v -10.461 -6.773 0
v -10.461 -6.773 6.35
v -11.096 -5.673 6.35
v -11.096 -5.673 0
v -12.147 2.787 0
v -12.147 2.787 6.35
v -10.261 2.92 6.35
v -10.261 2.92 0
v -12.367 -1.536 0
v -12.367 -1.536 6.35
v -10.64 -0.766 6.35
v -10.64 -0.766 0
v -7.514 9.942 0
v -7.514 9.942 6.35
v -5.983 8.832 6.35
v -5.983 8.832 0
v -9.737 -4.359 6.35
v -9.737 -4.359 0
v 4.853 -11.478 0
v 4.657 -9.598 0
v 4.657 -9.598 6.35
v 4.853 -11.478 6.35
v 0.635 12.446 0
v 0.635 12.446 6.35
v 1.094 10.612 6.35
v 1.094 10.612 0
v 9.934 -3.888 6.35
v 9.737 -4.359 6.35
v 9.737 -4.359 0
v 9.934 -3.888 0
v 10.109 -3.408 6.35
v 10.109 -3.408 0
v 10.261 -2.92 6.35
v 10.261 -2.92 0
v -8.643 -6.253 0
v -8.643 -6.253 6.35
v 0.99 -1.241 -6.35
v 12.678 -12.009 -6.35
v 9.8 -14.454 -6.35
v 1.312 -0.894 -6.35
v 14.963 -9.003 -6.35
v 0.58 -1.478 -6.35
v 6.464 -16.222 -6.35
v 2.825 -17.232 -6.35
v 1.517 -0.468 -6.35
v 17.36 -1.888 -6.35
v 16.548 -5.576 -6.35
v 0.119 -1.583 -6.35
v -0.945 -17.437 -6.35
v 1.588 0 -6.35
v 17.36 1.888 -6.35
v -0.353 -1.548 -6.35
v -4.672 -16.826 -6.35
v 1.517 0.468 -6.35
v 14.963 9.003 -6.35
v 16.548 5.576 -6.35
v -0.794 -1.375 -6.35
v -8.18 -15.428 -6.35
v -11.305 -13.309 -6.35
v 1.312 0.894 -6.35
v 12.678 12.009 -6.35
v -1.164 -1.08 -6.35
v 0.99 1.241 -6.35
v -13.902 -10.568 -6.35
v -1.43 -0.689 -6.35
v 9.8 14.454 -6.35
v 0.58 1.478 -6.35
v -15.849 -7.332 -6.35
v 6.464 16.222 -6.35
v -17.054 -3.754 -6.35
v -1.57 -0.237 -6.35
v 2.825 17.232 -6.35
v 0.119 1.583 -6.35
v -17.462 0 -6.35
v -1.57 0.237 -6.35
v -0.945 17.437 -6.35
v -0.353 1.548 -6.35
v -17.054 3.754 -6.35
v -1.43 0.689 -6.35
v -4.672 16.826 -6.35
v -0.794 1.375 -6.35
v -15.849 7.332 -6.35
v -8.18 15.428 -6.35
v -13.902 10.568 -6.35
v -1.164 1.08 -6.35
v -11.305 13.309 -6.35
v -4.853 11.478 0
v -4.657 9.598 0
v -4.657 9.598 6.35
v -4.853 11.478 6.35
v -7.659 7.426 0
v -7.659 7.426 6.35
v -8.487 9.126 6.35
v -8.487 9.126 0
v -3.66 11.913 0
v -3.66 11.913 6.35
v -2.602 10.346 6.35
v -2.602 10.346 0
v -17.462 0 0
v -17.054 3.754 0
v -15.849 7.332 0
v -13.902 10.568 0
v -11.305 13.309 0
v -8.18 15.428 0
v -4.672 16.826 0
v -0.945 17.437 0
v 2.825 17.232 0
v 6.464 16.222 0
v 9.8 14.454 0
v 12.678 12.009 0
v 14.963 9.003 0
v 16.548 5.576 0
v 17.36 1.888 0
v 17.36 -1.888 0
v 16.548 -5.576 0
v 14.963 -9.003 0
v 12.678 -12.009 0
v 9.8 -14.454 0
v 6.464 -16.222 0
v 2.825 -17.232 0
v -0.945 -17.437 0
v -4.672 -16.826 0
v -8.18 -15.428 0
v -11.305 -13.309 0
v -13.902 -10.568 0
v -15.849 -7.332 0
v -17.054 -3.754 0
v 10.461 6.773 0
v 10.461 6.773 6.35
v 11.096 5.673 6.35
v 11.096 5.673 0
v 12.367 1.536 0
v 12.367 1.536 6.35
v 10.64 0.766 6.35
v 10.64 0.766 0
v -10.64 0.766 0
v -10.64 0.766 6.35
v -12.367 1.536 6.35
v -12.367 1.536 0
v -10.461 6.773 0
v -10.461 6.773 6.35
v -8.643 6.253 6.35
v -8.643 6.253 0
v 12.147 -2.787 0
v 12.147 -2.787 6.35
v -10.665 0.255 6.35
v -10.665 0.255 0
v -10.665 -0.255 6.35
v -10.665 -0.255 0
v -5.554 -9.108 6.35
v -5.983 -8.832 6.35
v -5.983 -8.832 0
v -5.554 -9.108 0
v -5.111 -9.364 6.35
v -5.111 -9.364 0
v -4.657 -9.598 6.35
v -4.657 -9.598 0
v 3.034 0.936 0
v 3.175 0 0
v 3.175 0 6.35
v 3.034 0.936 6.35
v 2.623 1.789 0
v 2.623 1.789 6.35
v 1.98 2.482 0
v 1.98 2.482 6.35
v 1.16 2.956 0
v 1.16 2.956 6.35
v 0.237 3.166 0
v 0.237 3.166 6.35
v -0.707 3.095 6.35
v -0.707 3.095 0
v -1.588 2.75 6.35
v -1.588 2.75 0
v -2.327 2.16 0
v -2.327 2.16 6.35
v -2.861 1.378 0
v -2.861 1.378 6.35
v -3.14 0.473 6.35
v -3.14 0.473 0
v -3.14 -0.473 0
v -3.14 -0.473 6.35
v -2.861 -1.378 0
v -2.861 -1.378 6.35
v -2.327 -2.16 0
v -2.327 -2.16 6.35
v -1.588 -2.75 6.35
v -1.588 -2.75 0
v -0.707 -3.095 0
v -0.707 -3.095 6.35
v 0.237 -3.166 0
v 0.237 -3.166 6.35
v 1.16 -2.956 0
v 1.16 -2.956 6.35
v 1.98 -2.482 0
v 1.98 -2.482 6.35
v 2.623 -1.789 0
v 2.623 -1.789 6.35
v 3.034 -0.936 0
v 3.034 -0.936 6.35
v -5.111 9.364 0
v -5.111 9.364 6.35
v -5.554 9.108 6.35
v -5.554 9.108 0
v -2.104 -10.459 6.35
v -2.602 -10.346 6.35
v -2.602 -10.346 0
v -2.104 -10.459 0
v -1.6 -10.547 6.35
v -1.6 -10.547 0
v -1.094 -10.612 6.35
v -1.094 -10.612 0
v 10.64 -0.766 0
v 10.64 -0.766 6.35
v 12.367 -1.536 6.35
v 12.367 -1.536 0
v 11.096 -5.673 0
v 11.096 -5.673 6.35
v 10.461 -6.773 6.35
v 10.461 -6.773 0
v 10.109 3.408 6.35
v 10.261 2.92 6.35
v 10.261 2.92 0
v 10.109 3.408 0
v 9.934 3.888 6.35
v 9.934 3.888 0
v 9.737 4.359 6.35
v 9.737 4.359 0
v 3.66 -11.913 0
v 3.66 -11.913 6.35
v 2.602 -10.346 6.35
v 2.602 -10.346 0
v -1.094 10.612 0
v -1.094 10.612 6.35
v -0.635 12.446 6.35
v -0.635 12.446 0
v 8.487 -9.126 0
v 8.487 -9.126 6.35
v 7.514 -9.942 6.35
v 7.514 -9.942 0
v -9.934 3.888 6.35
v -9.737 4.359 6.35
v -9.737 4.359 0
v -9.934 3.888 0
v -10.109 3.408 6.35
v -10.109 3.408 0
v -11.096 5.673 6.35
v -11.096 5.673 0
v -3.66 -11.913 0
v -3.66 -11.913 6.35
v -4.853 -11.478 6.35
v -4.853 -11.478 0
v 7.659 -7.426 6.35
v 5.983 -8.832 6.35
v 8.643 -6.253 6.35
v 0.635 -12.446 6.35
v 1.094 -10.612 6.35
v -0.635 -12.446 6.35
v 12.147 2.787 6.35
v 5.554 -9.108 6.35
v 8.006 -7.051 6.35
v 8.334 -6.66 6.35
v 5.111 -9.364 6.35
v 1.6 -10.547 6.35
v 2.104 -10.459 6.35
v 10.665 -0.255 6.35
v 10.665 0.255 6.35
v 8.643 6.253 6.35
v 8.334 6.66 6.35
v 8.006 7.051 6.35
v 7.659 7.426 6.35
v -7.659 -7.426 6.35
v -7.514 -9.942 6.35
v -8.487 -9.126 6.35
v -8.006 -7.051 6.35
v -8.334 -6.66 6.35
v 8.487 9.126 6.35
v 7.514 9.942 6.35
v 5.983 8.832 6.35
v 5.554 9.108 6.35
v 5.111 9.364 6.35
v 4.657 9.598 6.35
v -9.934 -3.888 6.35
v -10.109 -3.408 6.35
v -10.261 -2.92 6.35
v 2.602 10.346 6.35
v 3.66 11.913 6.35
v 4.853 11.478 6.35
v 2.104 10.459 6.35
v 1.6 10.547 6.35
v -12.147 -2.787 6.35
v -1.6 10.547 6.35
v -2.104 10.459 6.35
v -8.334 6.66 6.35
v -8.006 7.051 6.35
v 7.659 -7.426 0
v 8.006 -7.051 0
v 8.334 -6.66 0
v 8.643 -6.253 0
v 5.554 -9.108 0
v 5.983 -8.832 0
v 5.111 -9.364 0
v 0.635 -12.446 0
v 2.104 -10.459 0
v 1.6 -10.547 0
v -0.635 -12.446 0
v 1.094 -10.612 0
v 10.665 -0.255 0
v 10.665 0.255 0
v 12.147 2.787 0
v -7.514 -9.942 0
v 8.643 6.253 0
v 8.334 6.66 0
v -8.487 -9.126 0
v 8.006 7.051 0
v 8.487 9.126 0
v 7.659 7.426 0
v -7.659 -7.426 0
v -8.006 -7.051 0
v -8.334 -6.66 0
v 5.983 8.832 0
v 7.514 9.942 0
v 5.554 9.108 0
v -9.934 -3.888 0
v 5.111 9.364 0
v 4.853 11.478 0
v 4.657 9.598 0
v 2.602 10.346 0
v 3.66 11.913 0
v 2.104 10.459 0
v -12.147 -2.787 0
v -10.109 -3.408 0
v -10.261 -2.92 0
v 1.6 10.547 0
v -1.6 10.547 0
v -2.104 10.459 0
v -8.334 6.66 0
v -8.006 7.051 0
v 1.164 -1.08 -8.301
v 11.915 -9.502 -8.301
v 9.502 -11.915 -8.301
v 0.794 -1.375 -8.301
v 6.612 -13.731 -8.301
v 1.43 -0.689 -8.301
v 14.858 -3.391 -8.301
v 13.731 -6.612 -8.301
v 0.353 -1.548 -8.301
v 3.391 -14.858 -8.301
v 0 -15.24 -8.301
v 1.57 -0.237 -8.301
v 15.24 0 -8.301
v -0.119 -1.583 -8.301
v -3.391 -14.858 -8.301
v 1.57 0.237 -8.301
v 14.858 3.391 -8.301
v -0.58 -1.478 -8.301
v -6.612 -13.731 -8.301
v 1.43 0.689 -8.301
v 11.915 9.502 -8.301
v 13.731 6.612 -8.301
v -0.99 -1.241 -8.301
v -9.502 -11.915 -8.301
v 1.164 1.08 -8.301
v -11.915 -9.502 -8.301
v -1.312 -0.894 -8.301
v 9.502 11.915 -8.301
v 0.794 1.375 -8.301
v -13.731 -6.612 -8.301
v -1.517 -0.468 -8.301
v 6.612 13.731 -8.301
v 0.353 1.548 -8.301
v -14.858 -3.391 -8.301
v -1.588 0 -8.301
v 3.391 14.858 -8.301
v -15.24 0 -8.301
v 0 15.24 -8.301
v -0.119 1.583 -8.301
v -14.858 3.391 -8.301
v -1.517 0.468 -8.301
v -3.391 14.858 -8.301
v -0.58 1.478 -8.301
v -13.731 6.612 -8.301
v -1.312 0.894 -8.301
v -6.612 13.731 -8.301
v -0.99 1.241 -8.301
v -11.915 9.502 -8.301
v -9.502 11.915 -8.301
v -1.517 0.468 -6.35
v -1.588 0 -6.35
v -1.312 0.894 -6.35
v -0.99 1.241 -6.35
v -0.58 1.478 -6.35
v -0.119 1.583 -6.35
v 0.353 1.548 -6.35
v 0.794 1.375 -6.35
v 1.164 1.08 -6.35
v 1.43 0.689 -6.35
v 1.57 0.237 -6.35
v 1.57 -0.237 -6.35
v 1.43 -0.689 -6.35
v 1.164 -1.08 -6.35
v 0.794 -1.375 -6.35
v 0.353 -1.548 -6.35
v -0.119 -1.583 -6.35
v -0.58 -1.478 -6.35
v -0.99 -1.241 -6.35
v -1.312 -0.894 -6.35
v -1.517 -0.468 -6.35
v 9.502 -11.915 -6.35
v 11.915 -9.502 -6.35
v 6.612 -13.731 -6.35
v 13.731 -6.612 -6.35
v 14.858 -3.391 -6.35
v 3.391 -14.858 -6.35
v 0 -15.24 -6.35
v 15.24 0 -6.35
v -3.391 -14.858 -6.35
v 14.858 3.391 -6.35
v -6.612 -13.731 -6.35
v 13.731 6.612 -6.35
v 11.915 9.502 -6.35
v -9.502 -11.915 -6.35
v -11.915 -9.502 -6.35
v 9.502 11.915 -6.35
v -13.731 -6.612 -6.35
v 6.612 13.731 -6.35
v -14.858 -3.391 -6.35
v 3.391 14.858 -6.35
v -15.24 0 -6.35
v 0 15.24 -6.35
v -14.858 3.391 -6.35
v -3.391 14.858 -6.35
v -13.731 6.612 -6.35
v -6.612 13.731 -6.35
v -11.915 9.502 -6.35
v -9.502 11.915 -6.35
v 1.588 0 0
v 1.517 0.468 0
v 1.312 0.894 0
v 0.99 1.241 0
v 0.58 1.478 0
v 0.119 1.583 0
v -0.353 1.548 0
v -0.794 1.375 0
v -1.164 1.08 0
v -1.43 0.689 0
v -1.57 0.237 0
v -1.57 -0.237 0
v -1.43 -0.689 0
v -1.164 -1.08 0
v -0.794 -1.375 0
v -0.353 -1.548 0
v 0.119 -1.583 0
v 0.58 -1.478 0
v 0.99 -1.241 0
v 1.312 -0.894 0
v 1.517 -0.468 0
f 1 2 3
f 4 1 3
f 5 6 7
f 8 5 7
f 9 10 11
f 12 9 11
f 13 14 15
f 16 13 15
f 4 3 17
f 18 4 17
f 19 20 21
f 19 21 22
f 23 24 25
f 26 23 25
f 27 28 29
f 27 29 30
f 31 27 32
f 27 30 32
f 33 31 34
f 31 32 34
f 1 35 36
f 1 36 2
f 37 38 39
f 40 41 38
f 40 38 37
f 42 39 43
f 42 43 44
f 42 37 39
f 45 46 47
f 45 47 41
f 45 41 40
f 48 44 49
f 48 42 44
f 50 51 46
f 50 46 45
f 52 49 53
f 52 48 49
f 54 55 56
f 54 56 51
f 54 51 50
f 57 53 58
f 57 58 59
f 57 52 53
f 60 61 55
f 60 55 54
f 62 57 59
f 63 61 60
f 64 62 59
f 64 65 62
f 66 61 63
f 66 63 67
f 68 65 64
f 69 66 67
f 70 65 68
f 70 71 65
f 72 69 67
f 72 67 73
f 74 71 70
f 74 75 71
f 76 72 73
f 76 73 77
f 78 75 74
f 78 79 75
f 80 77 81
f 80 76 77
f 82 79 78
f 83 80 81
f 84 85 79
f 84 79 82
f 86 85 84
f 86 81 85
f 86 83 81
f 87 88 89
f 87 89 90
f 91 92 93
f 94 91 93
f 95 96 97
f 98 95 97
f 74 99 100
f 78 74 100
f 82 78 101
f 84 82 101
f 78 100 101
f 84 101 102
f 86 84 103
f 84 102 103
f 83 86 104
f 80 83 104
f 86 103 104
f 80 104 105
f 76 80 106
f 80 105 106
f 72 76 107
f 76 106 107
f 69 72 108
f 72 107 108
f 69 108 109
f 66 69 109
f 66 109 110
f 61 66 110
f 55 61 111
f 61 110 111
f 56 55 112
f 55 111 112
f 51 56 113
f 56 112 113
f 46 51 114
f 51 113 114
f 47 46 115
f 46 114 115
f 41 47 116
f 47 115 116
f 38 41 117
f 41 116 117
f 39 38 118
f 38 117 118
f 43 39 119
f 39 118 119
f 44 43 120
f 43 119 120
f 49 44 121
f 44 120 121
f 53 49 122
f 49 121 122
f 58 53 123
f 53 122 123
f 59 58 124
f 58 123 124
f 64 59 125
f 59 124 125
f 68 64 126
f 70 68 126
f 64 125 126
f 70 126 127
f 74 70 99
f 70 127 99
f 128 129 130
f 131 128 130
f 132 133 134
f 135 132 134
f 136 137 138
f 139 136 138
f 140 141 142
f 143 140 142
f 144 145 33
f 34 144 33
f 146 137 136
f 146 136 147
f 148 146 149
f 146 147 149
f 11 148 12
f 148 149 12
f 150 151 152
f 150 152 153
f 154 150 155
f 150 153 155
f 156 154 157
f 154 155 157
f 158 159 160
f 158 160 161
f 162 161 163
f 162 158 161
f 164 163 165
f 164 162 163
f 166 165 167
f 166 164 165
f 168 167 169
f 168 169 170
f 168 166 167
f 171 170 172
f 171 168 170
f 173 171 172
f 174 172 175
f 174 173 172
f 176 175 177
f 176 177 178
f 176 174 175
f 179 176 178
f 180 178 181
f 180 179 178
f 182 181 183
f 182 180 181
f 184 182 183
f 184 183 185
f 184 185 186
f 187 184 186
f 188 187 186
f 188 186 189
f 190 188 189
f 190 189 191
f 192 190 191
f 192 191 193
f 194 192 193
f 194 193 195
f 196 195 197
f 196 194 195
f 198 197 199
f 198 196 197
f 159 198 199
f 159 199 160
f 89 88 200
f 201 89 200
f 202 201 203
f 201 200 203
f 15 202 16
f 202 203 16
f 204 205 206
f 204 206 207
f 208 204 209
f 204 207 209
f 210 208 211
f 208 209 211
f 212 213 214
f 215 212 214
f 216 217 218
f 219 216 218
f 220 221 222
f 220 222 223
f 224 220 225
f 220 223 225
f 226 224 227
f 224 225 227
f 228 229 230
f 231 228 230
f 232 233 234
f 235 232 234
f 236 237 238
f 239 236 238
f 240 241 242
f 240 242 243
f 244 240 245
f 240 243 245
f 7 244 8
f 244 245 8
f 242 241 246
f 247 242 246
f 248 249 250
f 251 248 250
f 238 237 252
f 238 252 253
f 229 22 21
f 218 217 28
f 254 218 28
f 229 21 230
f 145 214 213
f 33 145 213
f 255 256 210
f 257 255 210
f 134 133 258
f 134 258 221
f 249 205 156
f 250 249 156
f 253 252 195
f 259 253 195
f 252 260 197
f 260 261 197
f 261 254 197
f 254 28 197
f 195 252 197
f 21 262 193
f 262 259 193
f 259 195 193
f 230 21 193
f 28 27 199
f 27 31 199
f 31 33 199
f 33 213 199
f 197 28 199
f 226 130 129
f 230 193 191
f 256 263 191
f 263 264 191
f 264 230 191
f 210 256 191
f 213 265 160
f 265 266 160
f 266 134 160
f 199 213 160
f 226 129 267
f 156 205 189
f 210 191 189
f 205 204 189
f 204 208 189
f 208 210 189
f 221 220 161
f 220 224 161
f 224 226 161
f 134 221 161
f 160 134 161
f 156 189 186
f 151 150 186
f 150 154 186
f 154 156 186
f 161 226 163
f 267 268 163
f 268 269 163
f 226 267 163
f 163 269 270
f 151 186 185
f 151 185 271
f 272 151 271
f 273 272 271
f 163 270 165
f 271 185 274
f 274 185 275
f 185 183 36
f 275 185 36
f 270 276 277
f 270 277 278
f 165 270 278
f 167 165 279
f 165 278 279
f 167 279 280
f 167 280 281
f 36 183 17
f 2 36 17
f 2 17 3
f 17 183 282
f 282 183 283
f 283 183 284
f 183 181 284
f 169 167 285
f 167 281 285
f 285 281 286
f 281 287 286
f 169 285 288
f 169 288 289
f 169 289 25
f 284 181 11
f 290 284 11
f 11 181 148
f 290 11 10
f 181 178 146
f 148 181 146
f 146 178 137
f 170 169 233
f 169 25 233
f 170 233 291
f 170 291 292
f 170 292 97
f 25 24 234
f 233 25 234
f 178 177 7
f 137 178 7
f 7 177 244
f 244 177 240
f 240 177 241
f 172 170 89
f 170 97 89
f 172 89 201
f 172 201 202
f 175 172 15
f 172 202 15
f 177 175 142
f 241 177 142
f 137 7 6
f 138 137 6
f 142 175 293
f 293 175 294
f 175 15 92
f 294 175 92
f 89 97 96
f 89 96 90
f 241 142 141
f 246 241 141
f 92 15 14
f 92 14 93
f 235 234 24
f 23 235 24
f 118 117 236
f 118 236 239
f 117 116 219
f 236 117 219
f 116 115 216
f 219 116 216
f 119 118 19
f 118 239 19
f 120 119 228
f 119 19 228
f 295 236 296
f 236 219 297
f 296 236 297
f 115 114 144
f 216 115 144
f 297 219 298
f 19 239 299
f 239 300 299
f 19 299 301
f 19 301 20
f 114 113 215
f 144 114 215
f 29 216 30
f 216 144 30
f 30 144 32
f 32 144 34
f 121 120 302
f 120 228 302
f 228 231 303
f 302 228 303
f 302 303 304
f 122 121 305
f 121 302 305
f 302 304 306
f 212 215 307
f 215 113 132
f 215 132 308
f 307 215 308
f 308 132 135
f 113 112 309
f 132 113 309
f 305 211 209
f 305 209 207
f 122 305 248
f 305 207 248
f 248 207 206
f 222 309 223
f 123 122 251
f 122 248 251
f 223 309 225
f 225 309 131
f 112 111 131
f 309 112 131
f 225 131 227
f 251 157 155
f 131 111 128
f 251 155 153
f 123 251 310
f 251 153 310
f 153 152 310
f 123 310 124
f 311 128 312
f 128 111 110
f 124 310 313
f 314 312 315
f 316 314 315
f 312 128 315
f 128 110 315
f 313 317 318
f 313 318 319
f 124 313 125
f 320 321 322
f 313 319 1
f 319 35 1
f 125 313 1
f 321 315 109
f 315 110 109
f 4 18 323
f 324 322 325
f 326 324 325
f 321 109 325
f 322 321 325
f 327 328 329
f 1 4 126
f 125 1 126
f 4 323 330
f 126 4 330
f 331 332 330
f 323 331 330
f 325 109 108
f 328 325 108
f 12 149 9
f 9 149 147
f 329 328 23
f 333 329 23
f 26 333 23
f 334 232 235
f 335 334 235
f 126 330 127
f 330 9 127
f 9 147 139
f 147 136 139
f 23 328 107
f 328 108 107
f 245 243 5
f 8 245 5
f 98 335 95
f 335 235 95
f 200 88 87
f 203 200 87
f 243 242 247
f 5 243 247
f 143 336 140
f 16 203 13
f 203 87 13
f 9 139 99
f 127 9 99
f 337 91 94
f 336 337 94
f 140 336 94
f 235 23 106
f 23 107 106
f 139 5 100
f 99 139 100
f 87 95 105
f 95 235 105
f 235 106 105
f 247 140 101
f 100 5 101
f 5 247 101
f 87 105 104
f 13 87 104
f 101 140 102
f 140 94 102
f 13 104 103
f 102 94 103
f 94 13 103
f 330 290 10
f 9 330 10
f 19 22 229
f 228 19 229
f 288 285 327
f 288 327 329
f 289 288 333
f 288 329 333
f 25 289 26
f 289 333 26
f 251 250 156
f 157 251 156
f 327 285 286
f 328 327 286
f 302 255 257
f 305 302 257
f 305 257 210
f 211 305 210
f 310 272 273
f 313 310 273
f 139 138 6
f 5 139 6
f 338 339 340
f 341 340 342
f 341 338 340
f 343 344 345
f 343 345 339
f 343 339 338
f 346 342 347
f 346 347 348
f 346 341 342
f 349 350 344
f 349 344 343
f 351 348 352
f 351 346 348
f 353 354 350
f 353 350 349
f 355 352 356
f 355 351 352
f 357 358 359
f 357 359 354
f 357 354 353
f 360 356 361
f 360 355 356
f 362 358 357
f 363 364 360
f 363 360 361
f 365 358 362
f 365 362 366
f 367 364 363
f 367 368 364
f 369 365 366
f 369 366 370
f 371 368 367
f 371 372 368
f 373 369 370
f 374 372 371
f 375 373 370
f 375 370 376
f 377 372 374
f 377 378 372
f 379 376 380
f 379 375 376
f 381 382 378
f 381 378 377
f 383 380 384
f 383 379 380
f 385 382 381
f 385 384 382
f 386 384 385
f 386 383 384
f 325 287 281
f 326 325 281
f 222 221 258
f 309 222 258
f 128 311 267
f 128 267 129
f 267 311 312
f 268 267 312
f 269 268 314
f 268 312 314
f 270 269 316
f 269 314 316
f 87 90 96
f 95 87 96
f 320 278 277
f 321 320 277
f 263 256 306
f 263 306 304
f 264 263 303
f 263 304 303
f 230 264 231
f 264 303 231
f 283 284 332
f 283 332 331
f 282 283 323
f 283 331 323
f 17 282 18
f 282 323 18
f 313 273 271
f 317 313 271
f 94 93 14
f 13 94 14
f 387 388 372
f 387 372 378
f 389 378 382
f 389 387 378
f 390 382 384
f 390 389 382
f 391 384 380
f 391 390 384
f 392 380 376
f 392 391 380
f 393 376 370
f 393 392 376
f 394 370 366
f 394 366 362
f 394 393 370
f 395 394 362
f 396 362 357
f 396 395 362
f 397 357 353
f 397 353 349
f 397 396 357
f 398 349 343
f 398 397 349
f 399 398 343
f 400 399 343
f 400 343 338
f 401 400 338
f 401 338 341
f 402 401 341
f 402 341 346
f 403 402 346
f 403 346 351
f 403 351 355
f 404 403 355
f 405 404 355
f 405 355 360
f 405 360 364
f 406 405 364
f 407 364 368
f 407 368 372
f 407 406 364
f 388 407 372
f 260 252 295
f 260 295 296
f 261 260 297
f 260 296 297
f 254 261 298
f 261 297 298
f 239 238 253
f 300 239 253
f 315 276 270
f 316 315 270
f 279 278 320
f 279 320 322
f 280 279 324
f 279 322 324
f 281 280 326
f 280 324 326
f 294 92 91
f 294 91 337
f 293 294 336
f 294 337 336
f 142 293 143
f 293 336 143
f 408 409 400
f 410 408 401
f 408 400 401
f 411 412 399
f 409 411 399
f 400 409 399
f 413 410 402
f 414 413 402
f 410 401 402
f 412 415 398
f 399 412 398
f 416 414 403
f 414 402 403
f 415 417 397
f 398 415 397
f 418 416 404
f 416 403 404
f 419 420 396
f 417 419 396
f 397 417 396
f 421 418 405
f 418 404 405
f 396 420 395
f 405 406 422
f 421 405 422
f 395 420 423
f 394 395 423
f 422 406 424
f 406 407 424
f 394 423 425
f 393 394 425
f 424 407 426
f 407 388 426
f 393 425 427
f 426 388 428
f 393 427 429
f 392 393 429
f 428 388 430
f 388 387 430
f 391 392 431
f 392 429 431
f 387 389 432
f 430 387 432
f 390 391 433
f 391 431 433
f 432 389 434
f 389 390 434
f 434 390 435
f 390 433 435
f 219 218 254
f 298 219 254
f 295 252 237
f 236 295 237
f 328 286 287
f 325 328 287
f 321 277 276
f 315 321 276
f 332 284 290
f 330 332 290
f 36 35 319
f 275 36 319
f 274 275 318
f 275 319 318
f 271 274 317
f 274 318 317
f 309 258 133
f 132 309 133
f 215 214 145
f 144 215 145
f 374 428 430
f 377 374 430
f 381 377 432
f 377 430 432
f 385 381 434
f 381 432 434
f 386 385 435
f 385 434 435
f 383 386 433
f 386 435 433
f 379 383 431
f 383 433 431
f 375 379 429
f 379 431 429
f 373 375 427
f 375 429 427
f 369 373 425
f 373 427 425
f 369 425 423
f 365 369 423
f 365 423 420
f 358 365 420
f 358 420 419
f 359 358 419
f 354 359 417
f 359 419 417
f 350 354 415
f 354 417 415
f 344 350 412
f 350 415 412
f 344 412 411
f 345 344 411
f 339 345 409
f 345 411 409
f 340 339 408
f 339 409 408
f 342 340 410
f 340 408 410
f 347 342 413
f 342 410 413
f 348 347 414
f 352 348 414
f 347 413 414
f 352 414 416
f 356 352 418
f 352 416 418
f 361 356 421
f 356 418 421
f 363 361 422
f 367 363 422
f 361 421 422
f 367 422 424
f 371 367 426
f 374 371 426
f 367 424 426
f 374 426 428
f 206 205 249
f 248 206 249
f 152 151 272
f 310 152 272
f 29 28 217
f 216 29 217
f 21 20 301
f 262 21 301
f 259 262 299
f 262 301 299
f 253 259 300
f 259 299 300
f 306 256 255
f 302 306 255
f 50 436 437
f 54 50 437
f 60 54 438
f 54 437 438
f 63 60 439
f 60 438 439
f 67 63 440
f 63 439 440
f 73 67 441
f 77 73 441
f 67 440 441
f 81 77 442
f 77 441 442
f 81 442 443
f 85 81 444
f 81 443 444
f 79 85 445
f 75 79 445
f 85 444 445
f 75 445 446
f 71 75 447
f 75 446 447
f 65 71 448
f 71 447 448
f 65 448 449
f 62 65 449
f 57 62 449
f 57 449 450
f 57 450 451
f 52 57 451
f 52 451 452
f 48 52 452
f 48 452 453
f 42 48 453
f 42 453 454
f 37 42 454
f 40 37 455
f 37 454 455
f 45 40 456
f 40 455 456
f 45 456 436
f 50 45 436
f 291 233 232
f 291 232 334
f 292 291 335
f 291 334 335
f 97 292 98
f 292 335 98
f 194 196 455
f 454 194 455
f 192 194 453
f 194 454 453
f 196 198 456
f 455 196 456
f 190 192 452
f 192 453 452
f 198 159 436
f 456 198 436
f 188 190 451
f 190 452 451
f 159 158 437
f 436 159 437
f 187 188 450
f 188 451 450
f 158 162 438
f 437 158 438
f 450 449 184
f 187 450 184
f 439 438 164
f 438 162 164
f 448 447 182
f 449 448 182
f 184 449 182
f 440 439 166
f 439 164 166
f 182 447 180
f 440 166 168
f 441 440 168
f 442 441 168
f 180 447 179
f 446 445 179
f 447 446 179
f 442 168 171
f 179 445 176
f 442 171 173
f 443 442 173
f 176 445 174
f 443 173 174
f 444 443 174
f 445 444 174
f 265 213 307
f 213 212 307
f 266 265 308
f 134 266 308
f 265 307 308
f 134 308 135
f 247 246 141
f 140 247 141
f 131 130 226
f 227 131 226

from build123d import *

# Parameters (mm, degrees)
SKETCH1_R           = 10.668
SKETCH1_R_2         = 3.175
BOSS_EXTRUDE1_DEPTH = 6.35
BOSS_EXTRUDE2_DEPTH = 6.35
SKETCH3_R           = 17.4625
BOSS_EXTRUDE3_DEPTH = 6.35
SKETCH4_R           = 1.5875
CUT_EXTRUDE1_DEPTH  = 6.35
SKETCH5_R           = 15.24
SKETCH5_R_2         = 1.5875
BOSS_EXTRUDE4_DEPTH = 1.95072


with BuildPart() as part:
    # Sketch1 → Boss-Extrude1 (new body)
    with BuildSketch(Plane.XY):
        Circle(SKETCH1_R)
        Circle(SKETCH1_R_2, mode=Mode.SUBTRACT)
    extrude(amount=BOSS_EXTRUDE1_DEPTH)

    # Sketch2 → Boss-Extrude2 (add)
    with BuildSketch(Plane.XY.offset(6.35)):
        Polygon((-0.635, 12.446), (0.635, 12.446), (1.27, 9.906), (-1.27, 9.906), align=None)
        Polygon((4.853487518, 11.478231567), (4.581461168, 8.874229519), (2.194641911, 9.742960684), (3.66007789, 11.912597149), align=None)
        Polygon((8.486572812, 9.126019007), (7.340330504, 6.772095989), (5.394577619, 8.404776518), (7.513696369, 9.942359271), align=None)
        Polygon((11.096052176, 5.673073869), (9.21384765, 3.853147737), (7.94384765, 6.052852263), (10.461052176, 6.772926131), align=None)
        Polygon((12.367183887, 1.535872296), (9.976038787, 0.469453002), (9.534972416, 2.970864694), (12.146650701, 2.786578142), align=None)
        Polygon((12.146650701, -2.786578142), (9.534972416, -2.970864694), (9.976038787, -0.469453002), (12.367183887, -1.535872296), align=None)
        Polygon((10.461052176, -6.772926131), (7.94384765, -6.052852263), (9.21384765, -3.853147737), (11.096052176, -5.673073869), align=None)
        Polygon((7.513696369, -9.942359271), (5.394577619, -8.404776518), (7.340330504, -6.772095989), (8.486572812, -9.126019007), align=None)
        Polygon((3.66007789, -11.912597149), (2.194641911, -9.742960684), (4.581461168, -8.874229519), (4.853487518, -11.478231567), align=None)
        Polygon((-0.635, -12.446), (-1.27, -9.906), (1.27, -9.906), (0.635, -12.446), align=None)
        Polygon((-4.853487518, -11.478231567), (-4.581461168, -8.874229519), (-2.194641911, -9.742960684), (-3.66007789, -11.912597149), align=None)
        Polygon((-8.486572812, -9.126019007), (-7.340330504, -6.772095989), (-5.394577619, -8.404776518), (-7.513696369, -9.942359271), align=None)
        Polygon((-11.096052175, -5.673073869), (-9.21384765, -3.853147737), (-7.94384765, -6.052852263), (-10.461052175, -6.772926131), align=None)
        Polygon((-12.367183887, -1.535872296), (-9.976038787, -0.469453002), (-9.534972416, -2.970864694), (-12.146650701, -2.786578142), align=None)
        Polygon((-12.146650701, 2.786578142), (-9.534972416, 2.970864694), (-9.976038787, 0.469453002), (-12.367183887, 1.535872296), align=None)
        Polygon((-10.461052175, 6.772926131), (-7.94384765, 6.052852263), (-9.21384765, 3.853147737), (-11.096052175, 5.673073869), align=None)
        Polygon((-7.513696369, 9.942359271), (-5.394577619, 8.404776518), (-7.340330504, 6.772095989), (-8.486572812, 9.126019007), align=None)
        Polygon((-3.66007789, 11.912597149), (-2.194641911, 9.742960684), (-4.581461168, 8.874229519), (-4.853487518, 11.478231567), align=None)
    extrude(amount=-BOSS_EXTRUDE2_DEPTH)

    # Sketch3 → Boss-Extrude3 (add)
    with BuildSketch(Plane(origin=(0, 0, 0), x_dir=(-1, 0, 0), z_dir=(0, 0, -1))):
        Circle(SKETCH3_R)
    extrude(amount=BOSS_EXTRUDE3_DEPTH)

    # Sketch4 → Cut-Extrude1 (cut)
    with BuildSketch(Plane.XY):
        Circle(SKETCH4_R)
    extrude(amount=-CUT_EXTRUDE1_DEPTH, mode=Mode.SUBTRACT)


with BuildPart() as body_2:
    # Sketch5 → Boss-Extrude4 (new body)
    with BuildSketch(Plane(origin=(0, 0, -6.35), x_dir=(-1, 0, 0), z_dir=(0, 0, -1))):
        Circle(SKETCH5_R)
        Circle(SKETCH5_R_2, mode=Mode.SUBTRACT)
    extrude(amount=BOSS_EXTRUDE4_DEPTH)


solid = Compound([part.part, body_2.part])
